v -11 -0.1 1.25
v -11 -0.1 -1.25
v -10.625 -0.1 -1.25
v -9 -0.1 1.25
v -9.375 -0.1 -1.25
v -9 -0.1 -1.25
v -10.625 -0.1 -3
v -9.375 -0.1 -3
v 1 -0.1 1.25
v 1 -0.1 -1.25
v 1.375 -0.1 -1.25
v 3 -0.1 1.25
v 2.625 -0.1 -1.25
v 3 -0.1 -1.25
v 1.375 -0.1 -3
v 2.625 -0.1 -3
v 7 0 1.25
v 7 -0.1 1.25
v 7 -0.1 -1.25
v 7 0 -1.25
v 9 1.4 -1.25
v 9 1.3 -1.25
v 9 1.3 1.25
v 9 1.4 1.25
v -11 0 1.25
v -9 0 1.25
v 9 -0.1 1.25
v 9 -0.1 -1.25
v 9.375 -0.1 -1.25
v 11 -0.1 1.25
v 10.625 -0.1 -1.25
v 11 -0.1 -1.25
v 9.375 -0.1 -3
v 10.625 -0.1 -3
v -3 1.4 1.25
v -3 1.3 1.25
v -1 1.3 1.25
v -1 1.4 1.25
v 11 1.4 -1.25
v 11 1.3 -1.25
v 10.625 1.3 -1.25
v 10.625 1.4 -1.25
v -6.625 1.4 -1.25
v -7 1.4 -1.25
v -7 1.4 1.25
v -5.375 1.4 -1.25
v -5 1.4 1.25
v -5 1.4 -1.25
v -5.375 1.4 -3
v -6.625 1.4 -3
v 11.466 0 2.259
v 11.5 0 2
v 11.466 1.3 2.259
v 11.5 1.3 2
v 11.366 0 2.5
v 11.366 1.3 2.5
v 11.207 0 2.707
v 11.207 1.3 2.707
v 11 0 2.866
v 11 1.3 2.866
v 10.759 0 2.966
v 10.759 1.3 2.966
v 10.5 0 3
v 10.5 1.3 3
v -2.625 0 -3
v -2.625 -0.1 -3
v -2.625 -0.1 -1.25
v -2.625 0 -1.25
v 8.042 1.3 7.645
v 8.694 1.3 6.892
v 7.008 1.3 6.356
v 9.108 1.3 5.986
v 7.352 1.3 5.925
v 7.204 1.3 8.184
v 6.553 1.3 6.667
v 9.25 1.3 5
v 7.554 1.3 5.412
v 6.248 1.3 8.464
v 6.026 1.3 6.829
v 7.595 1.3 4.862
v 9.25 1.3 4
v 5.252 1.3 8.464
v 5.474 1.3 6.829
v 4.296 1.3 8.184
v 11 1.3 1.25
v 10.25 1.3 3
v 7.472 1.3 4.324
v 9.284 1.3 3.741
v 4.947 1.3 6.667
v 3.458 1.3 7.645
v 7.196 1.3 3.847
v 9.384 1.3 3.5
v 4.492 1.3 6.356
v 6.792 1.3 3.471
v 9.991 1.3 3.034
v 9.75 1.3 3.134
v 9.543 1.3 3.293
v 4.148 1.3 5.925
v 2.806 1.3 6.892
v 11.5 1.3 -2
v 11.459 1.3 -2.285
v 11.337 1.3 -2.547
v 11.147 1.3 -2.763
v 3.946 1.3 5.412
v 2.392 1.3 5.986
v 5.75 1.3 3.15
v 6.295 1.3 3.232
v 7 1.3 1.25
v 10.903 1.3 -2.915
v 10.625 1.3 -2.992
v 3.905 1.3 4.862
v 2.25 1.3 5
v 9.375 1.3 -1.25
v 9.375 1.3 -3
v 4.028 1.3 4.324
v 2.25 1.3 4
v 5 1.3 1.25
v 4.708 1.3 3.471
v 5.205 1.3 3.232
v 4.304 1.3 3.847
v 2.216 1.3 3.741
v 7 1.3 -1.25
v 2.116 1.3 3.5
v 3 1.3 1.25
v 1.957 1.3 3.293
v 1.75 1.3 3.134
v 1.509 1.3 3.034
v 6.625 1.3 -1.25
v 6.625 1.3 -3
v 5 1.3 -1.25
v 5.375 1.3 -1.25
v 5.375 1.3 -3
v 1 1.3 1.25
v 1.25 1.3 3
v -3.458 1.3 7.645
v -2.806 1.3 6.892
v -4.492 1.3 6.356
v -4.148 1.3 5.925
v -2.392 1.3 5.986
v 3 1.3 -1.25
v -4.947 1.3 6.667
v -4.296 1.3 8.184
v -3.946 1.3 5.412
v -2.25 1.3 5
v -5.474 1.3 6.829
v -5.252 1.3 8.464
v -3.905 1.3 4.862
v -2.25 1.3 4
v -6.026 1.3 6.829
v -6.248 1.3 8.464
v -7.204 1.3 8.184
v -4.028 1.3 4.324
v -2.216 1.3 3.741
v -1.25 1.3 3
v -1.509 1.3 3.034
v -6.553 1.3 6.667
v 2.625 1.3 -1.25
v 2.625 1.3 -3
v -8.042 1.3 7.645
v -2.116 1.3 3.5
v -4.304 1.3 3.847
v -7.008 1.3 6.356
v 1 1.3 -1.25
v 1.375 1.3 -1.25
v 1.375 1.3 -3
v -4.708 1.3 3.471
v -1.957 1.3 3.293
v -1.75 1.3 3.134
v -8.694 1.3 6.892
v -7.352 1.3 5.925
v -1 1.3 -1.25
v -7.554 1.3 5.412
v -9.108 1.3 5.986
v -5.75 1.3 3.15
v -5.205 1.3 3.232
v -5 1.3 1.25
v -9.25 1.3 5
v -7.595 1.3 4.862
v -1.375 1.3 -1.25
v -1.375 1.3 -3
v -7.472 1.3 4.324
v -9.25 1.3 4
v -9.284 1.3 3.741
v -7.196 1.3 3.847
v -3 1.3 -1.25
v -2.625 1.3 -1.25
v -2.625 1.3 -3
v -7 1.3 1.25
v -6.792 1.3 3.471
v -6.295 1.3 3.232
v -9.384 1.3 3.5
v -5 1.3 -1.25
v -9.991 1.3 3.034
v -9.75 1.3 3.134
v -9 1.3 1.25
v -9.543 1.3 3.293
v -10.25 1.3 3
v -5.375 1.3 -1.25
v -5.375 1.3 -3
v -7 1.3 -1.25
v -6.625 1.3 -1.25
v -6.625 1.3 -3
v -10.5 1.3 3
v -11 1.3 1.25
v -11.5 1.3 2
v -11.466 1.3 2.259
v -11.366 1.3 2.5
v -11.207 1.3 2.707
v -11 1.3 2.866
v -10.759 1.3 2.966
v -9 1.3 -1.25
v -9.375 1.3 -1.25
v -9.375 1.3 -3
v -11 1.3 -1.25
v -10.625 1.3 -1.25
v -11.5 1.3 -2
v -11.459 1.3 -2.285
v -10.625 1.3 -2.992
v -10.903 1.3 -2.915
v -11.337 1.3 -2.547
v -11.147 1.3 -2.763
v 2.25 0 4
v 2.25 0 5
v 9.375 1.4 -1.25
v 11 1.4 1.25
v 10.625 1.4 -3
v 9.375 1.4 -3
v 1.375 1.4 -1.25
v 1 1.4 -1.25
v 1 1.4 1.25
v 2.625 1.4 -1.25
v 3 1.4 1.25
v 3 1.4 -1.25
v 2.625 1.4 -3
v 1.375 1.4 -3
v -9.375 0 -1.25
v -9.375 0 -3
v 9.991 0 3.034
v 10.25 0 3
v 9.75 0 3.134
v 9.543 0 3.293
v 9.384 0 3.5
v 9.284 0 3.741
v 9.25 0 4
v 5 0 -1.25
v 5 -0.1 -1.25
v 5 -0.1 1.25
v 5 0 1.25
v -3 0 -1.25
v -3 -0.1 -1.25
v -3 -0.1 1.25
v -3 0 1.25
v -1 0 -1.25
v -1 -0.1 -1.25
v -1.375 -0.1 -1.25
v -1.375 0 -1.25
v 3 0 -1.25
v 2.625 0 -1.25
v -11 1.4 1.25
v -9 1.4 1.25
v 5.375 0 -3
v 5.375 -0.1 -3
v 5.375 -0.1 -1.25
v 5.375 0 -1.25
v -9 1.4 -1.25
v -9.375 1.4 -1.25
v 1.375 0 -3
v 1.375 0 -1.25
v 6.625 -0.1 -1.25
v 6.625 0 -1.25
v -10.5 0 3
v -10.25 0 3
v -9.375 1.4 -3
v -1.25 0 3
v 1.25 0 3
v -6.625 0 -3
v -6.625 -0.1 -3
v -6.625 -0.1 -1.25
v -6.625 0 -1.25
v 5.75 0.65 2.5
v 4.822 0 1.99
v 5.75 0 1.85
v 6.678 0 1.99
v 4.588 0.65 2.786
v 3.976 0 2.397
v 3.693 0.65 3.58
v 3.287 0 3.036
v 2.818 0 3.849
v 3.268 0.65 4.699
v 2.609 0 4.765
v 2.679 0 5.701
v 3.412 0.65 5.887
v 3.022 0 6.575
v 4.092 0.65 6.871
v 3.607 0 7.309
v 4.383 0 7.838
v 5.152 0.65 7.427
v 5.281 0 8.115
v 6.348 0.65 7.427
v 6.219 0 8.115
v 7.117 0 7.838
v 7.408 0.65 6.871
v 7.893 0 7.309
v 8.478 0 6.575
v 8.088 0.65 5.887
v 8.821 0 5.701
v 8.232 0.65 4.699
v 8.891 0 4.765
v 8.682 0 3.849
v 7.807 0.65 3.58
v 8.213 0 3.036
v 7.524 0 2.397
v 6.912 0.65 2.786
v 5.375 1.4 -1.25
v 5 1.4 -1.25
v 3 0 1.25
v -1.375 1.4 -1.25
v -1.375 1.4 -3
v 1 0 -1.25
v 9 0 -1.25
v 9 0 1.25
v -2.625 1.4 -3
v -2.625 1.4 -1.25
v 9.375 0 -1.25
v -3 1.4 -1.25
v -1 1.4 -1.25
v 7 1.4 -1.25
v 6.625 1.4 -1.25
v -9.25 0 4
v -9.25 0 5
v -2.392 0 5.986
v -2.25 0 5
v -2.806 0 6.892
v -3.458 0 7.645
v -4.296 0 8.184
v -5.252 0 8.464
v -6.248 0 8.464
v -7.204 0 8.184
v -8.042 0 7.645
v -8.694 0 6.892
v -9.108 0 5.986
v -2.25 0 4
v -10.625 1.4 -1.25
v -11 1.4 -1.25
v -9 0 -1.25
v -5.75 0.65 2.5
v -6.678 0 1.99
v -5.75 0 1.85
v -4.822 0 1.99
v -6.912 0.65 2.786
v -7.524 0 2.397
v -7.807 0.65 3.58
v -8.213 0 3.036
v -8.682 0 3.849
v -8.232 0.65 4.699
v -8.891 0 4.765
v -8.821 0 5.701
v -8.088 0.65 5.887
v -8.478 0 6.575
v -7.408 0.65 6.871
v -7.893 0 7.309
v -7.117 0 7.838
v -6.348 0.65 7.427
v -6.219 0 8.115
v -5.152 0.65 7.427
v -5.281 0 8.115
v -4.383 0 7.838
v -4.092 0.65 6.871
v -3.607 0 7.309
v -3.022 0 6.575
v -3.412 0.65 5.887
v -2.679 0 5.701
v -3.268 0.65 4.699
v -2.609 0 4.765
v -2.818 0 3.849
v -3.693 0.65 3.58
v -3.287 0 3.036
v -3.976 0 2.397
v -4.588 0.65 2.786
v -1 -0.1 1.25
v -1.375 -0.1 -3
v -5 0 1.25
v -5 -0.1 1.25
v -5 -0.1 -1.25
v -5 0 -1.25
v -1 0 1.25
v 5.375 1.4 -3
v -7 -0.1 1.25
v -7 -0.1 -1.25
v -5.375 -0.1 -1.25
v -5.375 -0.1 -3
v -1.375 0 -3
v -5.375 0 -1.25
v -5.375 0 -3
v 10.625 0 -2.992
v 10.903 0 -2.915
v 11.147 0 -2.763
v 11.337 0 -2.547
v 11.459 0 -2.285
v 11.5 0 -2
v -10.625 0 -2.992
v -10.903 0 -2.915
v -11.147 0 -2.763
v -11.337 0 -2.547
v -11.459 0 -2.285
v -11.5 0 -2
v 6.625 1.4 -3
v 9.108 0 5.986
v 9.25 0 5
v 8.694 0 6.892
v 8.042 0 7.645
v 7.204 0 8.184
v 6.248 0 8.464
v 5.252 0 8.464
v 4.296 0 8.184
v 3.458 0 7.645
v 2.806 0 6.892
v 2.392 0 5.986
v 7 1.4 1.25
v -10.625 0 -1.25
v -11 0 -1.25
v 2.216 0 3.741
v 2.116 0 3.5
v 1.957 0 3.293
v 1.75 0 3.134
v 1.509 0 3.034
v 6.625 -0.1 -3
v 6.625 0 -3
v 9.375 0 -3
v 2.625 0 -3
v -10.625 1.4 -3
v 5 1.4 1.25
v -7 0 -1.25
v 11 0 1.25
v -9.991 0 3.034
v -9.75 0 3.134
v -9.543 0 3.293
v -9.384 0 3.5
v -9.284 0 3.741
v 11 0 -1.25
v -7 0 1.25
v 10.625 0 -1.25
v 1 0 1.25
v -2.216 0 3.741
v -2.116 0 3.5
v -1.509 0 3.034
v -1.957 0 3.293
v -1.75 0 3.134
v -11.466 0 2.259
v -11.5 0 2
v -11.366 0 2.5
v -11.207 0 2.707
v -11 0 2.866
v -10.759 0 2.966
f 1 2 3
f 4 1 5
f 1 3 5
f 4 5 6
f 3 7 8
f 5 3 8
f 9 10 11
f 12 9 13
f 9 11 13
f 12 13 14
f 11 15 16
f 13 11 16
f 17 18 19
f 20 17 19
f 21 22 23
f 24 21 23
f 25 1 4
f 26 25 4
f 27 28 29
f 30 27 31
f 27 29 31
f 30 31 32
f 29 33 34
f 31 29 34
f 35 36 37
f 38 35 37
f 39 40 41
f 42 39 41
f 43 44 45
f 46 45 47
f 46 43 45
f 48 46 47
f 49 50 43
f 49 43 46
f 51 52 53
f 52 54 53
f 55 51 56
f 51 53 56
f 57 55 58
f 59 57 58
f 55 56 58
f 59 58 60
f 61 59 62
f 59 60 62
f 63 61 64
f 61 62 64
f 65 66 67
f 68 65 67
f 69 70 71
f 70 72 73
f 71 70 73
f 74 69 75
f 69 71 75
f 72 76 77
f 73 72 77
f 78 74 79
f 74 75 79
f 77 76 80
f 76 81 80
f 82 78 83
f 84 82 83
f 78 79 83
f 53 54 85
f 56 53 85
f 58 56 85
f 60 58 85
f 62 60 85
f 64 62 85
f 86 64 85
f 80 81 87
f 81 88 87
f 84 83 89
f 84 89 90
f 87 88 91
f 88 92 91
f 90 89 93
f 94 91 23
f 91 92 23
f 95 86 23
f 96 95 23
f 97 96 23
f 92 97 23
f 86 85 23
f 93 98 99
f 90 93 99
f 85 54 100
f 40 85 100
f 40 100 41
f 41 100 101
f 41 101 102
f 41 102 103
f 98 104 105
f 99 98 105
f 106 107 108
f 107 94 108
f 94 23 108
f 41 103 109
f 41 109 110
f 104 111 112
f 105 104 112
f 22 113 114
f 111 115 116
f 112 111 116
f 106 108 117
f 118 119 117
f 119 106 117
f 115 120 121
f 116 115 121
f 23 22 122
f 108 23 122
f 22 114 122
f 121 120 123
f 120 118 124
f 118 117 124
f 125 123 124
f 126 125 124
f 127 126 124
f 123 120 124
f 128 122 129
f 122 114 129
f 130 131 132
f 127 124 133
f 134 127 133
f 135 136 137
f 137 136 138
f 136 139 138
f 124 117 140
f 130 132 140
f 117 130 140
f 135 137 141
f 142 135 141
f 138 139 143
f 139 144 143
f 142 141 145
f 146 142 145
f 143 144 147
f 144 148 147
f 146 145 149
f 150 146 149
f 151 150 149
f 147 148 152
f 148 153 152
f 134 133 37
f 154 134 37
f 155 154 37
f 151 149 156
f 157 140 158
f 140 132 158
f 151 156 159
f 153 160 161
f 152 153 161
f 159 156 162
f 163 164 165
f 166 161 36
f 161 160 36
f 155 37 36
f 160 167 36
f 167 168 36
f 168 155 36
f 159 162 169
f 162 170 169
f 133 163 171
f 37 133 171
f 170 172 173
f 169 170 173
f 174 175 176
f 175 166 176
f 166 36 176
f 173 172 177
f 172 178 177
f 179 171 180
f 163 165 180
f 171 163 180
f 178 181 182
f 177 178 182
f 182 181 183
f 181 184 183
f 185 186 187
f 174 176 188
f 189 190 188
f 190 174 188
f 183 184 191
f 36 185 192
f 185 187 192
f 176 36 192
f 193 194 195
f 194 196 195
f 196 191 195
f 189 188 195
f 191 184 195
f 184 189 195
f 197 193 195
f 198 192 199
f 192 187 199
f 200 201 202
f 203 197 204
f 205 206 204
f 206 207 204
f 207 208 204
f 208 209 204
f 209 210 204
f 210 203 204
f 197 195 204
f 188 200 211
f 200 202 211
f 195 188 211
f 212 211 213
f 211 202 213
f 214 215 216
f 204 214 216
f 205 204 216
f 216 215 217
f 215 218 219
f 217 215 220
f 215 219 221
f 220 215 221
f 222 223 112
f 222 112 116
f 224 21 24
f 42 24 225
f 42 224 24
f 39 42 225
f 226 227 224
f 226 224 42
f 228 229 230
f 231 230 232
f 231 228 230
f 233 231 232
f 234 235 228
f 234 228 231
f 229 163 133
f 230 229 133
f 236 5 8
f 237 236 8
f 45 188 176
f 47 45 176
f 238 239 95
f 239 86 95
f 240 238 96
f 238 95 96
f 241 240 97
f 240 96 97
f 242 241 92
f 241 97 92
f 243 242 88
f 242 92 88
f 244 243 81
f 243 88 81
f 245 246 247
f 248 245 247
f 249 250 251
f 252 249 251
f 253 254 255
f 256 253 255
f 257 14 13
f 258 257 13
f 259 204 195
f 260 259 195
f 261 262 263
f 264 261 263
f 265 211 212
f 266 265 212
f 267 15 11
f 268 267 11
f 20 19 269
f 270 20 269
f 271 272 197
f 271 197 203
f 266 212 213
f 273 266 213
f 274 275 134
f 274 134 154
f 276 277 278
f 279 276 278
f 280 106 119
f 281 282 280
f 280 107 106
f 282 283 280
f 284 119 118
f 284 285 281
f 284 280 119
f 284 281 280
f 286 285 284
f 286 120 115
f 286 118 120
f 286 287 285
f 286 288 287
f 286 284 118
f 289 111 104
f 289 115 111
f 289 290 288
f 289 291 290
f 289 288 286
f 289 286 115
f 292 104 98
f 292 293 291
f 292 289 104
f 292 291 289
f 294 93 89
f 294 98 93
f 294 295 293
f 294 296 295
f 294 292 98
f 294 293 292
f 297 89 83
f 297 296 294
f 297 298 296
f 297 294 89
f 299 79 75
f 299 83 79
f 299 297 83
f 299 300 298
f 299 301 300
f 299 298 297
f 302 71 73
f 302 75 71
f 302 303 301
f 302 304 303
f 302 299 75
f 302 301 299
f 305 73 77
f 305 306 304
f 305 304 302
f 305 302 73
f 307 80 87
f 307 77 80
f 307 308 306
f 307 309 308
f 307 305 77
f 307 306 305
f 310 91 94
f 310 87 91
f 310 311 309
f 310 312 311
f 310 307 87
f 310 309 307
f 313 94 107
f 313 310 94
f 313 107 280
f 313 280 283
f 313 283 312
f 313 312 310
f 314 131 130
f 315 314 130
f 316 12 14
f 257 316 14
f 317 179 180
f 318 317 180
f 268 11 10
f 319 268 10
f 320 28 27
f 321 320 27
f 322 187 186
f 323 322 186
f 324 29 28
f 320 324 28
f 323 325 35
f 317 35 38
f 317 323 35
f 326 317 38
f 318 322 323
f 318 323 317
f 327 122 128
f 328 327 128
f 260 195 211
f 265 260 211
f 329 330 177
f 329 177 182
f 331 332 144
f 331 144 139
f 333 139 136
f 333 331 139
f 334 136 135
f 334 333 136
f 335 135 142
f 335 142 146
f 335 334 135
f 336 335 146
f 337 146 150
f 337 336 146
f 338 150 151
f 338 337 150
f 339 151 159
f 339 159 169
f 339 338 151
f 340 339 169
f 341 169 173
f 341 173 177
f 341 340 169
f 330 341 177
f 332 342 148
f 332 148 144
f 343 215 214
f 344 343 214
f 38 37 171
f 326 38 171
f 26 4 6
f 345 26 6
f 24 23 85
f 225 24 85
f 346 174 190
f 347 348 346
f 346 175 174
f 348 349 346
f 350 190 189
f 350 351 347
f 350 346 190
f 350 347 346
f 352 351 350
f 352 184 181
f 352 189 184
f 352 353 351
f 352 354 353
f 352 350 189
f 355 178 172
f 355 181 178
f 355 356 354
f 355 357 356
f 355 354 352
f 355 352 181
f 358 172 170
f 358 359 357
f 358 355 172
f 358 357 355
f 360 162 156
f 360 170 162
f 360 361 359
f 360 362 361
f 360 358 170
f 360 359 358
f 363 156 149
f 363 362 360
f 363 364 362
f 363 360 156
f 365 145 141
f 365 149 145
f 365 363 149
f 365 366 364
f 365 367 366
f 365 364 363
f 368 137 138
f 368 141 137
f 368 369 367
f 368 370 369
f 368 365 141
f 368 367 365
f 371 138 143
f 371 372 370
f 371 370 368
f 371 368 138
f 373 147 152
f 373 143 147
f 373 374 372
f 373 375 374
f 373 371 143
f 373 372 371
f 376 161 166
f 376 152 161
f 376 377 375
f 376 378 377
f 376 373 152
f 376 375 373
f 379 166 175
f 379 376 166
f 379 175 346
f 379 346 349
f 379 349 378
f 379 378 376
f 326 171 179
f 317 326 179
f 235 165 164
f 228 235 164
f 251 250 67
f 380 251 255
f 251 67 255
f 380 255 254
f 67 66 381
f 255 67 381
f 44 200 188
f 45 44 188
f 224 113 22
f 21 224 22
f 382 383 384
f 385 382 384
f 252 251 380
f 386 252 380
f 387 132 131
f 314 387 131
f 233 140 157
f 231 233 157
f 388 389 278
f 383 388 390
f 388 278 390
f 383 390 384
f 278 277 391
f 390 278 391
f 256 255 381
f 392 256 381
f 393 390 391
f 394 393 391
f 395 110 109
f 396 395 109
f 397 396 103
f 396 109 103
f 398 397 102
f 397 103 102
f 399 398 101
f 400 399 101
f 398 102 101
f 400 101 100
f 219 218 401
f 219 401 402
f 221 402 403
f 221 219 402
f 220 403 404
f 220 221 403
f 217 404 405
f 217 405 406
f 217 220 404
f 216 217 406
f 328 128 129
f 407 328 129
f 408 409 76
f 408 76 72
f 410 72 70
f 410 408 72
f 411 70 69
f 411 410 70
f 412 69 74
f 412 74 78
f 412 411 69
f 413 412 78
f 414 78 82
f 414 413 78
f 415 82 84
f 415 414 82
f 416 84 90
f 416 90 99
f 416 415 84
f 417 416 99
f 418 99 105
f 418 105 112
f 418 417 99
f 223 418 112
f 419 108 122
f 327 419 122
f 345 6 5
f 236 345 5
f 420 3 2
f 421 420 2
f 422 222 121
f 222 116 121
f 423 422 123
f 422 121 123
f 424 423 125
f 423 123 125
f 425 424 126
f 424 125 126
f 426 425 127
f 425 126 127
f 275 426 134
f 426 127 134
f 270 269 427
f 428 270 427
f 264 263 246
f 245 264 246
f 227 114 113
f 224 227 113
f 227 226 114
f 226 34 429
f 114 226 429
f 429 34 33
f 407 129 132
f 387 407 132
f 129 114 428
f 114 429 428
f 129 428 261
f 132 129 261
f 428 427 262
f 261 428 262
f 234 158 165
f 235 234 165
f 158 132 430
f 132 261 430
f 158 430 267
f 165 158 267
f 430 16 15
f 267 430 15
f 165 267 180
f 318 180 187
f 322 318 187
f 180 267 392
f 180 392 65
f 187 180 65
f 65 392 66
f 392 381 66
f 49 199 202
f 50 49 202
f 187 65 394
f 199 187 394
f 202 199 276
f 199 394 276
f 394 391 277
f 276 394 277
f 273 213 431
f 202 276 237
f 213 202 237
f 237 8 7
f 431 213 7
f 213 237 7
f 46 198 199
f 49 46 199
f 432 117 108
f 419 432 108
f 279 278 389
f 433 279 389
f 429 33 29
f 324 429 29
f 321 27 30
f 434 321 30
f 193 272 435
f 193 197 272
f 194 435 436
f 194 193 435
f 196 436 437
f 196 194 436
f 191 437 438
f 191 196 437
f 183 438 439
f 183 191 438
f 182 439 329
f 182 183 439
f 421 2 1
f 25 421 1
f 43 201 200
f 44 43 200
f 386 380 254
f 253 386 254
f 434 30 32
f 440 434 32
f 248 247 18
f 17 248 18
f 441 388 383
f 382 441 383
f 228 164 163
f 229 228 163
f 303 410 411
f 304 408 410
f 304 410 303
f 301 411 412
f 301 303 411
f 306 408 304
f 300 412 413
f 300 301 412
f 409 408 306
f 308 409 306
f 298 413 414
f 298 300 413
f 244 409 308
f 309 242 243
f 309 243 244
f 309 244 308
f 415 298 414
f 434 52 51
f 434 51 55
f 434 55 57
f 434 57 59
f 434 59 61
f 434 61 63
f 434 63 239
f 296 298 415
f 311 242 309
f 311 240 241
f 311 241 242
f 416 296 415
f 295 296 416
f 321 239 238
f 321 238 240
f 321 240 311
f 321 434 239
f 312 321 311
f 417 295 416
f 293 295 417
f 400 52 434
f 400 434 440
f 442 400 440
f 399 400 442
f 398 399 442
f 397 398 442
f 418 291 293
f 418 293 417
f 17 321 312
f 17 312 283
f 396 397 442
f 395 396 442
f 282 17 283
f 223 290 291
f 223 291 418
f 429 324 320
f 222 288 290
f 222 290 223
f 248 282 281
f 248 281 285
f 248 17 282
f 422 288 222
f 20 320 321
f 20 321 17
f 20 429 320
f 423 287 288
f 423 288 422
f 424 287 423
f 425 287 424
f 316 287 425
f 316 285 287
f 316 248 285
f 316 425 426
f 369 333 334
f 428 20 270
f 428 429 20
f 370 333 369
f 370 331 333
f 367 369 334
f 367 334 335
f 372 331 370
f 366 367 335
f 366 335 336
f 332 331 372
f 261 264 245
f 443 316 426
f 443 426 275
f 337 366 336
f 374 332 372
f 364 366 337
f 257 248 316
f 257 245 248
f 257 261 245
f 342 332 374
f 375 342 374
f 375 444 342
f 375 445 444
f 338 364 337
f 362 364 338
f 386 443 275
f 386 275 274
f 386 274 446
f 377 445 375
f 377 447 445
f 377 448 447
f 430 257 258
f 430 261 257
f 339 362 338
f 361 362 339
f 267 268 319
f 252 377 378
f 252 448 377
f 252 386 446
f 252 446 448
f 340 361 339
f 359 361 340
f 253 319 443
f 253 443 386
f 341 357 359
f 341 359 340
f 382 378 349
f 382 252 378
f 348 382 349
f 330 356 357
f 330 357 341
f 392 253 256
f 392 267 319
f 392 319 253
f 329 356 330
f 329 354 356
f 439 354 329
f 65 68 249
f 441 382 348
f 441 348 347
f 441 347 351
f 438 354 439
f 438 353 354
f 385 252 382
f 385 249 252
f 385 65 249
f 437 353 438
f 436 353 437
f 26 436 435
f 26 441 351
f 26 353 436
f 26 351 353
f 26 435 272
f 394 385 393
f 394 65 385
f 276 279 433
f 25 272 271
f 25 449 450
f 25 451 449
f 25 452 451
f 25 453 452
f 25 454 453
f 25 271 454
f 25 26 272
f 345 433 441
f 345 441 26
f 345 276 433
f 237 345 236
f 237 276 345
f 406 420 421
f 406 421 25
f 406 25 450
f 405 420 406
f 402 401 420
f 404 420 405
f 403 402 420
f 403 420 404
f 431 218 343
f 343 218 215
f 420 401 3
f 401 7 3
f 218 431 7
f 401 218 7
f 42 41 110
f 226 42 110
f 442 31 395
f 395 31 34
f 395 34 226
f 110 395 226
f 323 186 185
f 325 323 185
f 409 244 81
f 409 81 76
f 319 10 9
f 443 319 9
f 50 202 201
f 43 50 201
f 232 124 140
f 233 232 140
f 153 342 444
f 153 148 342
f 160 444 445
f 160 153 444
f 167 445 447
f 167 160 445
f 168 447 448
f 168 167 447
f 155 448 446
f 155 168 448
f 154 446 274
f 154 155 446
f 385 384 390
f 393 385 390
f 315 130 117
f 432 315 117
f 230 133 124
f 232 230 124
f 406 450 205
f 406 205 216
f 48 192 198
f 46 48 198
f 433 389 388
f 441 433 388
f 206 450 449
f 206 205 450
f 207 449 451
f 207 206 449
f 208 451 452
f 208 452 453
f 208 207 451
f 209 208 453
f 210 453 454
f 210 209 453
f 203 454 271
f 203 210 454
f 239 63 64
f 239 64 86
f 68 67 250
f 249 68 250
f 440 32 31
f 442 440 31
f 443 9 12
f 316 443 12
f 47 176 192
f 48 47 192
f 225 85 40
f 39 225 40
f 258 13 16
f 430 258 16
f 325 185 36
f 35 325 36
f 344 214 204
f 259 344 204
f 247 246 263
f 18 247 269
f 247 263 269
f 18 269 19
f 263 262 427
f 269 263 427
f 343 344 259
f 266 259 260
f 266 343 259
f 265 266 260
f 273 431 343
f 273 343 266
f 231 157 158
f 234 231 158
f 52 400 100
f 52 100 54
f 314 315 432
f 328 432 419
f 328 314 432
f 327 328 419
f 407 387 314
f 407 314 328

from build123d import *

# Parameters (mm, degrees)
SKETCH1_R                                      = 1.5
BOSS_EXTRUDE1_DEPTH                            = 1.3
FILLET1_R                                      = 1
BOSS_EXTRUDE3_DEPTH                            = 0.1
BOSS_EXTRUDE3_DEPTH_BACK                       = 1.4
CSK_FOR_M3_FLAT_HEAD_MACHINE_SCREW2_AT_2_COUNT = 2
CSK_FOR_M3_FLAT_HEAD_MACHINE_SCREW2_AT_2_PITCH = 11.5


with BuildPart() as part:
    # Sketch1 → Boss-Extrude1 (new body)
    with BuildSketch(Plane(origin=(0, 0, 0), x_dir=(1, 0, 0), z_dir=(0, 1, 0))):
        with BuildLine():
            Line((-11.5, 3), (11.5, 3))
            Line((11.5, 3), (11.5, -3))
            Line((11.5, -3), (9.25, -3))
            Line((9.25, -3), (9.25, -5))
            ThreePointArc((9.25, -5), (5.75, -8.5), (2.25, -5))
            Line((2.25, -5), (2.25, -3))
            Line((2.25, -3), (-2.25, -3))
            Line((-2.25, -3), (-2.25, -5))
            ThreePointArc((-2.25, -5), (-5.75, -8.5), (-9.25, -5))
            Line((-9.25, -5), (-9.25, -3))
            Line((-9.25, -3), (-11.5, -3))
            Line((-11.5, -3), (-11.5, 3))
        make_face()
        with Locations(Location((5.75, -5, 0), (0, 0, 270))):
            Circle(SKETCH1_R, mode=Mode.SUBTRACT)
        with Locations(Location((-5.75, -5, 0), (0, 0, 270))):
            Circle(SKETCH1_R, mode=Mode.SUBTRACT)
    extrude(amount=BOSS_EXTRUDE1_DEPTH)

    # Fillet1
    fillet1_edges = [part.edges().sort_by_distance(p)[0] for p in [
        (9.25, 0.65, 3),
        (2.25, 0.65, 3),
        (-2.25, 0.65, 3),
        (-9.25, 0.65, 3),
        (-11.5, 0.65, 3),
        (-11.5, 0.65, -3),
        (11.5, 0.65, -3),
        (11.5, 0.65, 3),
    ]]
    fillet(fillet1_edges, radius=FILLET1_R)

    # Sketch5 → Boss-Extrude3 (add, two sides: drawn at the far end of the back side and taken through both)
    with BuildSketch(Plane(origin=(0, 1.3, 0), x_dir=(1, 0, 0), z_dir=(0, 1, 0)).offset(-BOSS_EXTRUDE3_DEPTH_BACK)):
        Polygon((-11, -1.25), (-9, -1.25), (-9, 1.25), (-9.375, 1.25), (-9.375, 3), (-10.625, 3), (-10.625, 1.25), (-11, 1.25), align=None)
        Polygon((-7, -1.25), (-5, -1.25), (-5, 1.25), (-5.375, 1.25), (-5.375, 3), (-6.625, 3), (-6.625, 1.25), (-7, 1.25), align=None)
        Polygon((-3, -1.25), (-1, -1.25), (-1, 1.25), (-1.375, 1.25), (-1.375, 3), (-2.625, 3), (-2.625, 1.25), (-3, 1.25), align=None)
        Polygon((1, -1.25), (3, -1.25), (3, 1.25), (2.625, 1.25), (2.625, 3), (1.375, 3), (1.375, 1.25), (1, 1.25), align=None)
        Polygon((5, -1.25), (7, -1.25), (7, 1.25), (6.625, 1.25), (6.625, 3), (5.375, 3), (5.375, 1.25), (5, 1.25), align=None)
        Polygon((9, -1.25), (11, -1.25), (11, 1.25), (10.625, 1.25), (10.625, 3), (9.375, 3), (9.375, 1.25), (9, 1.25), align=None)
    extrude(amount=BOSS_EXTRUDE3_DEPTH + BOSS_EXTRUDE3_DEPTH_BACK)

    # Sketch7 → CSK for M3 Flat Head Machine Screw2 (revolve, cut)
    with BuildSketch(Plane(origin=(5.75, 0, 5), x_dir=(0, 0, -1), z_dir=(1, 0, 0))):
        Polygon((0, 0), (0, 1.4), (1.7, 1.4), (1.7, 1.45), (3.15, 0), align=None)
    csk_for_m3_flat_head_machine_screw2 = revolve(axis=Axis((5.75, -6.35, 5), (0, 1, 0)), mode=Mode.SUBTRACT)

    # CSK for M3 Flat Head Machine Screw2 at 2: CSK for M3 Flat Head Machine Screw2 ×2
    with Locations(*[(-i * CSK_FOR_M3_FLAT_HEAD_MACHINE_SCREW2_AT_2_PITCH, 0, 0) for i in range(1, CSK_FOR_M3_FLAT_HEAD_MACHINE_SCREW2_AT_2_COUNT)]):
        add(csk_for_m3_flat_head_machine_screw2, mode=Mode.SUBTRACT)


solid = part.part
